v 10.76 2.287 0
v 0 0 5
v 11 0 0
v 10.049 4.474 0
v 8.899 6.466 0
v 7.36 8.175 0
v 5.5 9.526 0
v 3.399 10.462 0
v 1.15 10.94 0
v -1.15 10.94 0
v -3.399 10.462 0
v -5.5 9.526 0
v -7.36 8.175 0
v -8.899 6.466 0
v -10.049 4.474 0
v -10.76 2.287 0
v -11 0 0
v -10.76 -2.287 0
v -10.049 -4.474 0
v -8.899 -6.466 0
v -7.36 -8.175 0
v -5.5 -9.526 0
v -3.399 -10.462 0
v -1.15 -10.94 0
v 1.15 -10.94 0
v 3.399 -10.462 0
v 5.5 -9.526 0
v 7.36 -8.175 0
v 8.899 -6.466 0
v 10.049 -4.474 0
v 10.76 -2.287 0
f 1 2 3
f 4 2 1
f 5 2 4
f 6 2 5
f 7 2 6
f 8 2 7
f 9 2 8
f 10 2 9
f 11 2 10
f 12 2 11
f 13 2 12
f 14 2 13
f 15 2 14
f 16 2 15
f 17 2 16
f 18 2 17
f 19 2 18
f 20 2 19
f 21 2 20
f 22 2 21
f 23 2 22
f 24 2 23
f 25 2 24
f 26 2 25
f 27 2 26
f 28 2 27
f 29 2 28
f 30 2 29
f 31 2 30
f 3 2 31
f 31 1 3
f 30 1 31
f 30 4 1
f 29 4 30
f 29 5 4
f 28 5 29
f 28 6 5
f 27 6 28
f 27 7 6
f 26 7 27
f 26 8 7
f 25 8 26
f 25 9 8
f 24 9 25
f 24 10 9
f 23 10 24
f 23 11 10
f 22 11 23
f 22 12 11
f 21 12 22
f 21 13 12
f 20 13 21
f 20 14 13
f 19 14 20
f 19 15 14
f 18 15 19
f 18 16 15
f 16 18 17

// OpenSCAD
// Generated by SolidPython 1.0.1 on 2020-07-29 00:46:43


cylinder(h = 5, r1 = 11, r2 = 0);
/***********************************************
*********      SolidPython code:      **********
************************************************
 
# import packages: SolidPython
from solid import *
from solid.utils import *
from itertools import chain, combinations, permutations


class Resize:

    def __init__(self, scad_file):
        self.scad_file = scad_file
        #self.scad_file = import_scad(scad_file)
        # cone/cylinder param:
        self.r1 = 0
        self.r2 = 0
        self.h = 0
        # rectangular prism param:
        self.w = 0
        self.l = 0
        # ellipse param:
        self.r = 0

    # import OpenScad code (file name corresponds to shape)


    # classify shape + parameters
    def assign(self, param1, param2, param3):
        if self.scad_file == 'cone.scad':
            self.r1 = param1
            self.r2 = param2
            self.h = param3
        elif self.scad_file == 'cylinder.scad':
            self.r1 = param1
            self.r2 = param2
            self.h = param3
        elif self.scad_file == 'rectangularPrism.scad':
            self.h = param1
            self.l = param2
            self.w = param3
        else:
            self.r = param1
            self.h = param2

    # resize parameters
    def iterate(self):
        x = range(3, 20, 2)
        i = 1
        if self.scad_file == 'cone.scad':
            tempList = list(permutations(x, 2))
            for temp in tempList:
                param1 = temp[0]
                param2 = temp[1]
                filepath = 'produced_scad_files/' + 'cone' + str(param1) + '_' + str(param2) + '_' + '.scad'
                scad_render_to_file(cylinder(h=param1, r1=param2, r2=0), filepath)

        elif self.scad_file == 'cylinder.scad':
            tempList = list(permutations(x, 3))
            for temp in tempList:
                param1 = temp[0]
                param2 = temp[1]
                filepath = 'produced_scad_files/' + 'cylinder' + str(param1) + '_' + str(param2) + '_' + '.scad'
                scad_render_to_file(cylinder(h=param1, r1=param2, r2=param2), filepath)

        elif self.scad_file == 'rectangularPrism.scad':
            tempList = list(permutations(x, 3))
            for temp in tempList:
                param1 = temp[0]
                param2 = temp[1]
                param3 = temp[2]
                filepath = 'produced_scad_files/' + 'rectangularPrism' + str(param1) + '_' + str(param2) + '_' + str(
                    param3) + '.scad'
                scad_render_to_file(cube(size=(param1, param2, param3)), filepath)

        elif self.scad_file == 'ellipse.scad':
            tempList = list(permutations(x, 4))
            for temp in tempList:
                param1 = temp[0]
                param2 = temp[1]
                param3 = temp[2]
                param4 = temp[3]
                filepath = 'produced_scad_files/' + 'ellipse' + str(param1) + '_' + str(param2) + '_' + str(param3) + '_' + str(param4) + '.scad'
                scad_render_to_file(scale([param1, param2, param3])(sphere(r=param4)), filepath)

    def render_to_scadfile(self):
        scad_render_to_file(scad, 'example.scad') 
 
************************************************/
